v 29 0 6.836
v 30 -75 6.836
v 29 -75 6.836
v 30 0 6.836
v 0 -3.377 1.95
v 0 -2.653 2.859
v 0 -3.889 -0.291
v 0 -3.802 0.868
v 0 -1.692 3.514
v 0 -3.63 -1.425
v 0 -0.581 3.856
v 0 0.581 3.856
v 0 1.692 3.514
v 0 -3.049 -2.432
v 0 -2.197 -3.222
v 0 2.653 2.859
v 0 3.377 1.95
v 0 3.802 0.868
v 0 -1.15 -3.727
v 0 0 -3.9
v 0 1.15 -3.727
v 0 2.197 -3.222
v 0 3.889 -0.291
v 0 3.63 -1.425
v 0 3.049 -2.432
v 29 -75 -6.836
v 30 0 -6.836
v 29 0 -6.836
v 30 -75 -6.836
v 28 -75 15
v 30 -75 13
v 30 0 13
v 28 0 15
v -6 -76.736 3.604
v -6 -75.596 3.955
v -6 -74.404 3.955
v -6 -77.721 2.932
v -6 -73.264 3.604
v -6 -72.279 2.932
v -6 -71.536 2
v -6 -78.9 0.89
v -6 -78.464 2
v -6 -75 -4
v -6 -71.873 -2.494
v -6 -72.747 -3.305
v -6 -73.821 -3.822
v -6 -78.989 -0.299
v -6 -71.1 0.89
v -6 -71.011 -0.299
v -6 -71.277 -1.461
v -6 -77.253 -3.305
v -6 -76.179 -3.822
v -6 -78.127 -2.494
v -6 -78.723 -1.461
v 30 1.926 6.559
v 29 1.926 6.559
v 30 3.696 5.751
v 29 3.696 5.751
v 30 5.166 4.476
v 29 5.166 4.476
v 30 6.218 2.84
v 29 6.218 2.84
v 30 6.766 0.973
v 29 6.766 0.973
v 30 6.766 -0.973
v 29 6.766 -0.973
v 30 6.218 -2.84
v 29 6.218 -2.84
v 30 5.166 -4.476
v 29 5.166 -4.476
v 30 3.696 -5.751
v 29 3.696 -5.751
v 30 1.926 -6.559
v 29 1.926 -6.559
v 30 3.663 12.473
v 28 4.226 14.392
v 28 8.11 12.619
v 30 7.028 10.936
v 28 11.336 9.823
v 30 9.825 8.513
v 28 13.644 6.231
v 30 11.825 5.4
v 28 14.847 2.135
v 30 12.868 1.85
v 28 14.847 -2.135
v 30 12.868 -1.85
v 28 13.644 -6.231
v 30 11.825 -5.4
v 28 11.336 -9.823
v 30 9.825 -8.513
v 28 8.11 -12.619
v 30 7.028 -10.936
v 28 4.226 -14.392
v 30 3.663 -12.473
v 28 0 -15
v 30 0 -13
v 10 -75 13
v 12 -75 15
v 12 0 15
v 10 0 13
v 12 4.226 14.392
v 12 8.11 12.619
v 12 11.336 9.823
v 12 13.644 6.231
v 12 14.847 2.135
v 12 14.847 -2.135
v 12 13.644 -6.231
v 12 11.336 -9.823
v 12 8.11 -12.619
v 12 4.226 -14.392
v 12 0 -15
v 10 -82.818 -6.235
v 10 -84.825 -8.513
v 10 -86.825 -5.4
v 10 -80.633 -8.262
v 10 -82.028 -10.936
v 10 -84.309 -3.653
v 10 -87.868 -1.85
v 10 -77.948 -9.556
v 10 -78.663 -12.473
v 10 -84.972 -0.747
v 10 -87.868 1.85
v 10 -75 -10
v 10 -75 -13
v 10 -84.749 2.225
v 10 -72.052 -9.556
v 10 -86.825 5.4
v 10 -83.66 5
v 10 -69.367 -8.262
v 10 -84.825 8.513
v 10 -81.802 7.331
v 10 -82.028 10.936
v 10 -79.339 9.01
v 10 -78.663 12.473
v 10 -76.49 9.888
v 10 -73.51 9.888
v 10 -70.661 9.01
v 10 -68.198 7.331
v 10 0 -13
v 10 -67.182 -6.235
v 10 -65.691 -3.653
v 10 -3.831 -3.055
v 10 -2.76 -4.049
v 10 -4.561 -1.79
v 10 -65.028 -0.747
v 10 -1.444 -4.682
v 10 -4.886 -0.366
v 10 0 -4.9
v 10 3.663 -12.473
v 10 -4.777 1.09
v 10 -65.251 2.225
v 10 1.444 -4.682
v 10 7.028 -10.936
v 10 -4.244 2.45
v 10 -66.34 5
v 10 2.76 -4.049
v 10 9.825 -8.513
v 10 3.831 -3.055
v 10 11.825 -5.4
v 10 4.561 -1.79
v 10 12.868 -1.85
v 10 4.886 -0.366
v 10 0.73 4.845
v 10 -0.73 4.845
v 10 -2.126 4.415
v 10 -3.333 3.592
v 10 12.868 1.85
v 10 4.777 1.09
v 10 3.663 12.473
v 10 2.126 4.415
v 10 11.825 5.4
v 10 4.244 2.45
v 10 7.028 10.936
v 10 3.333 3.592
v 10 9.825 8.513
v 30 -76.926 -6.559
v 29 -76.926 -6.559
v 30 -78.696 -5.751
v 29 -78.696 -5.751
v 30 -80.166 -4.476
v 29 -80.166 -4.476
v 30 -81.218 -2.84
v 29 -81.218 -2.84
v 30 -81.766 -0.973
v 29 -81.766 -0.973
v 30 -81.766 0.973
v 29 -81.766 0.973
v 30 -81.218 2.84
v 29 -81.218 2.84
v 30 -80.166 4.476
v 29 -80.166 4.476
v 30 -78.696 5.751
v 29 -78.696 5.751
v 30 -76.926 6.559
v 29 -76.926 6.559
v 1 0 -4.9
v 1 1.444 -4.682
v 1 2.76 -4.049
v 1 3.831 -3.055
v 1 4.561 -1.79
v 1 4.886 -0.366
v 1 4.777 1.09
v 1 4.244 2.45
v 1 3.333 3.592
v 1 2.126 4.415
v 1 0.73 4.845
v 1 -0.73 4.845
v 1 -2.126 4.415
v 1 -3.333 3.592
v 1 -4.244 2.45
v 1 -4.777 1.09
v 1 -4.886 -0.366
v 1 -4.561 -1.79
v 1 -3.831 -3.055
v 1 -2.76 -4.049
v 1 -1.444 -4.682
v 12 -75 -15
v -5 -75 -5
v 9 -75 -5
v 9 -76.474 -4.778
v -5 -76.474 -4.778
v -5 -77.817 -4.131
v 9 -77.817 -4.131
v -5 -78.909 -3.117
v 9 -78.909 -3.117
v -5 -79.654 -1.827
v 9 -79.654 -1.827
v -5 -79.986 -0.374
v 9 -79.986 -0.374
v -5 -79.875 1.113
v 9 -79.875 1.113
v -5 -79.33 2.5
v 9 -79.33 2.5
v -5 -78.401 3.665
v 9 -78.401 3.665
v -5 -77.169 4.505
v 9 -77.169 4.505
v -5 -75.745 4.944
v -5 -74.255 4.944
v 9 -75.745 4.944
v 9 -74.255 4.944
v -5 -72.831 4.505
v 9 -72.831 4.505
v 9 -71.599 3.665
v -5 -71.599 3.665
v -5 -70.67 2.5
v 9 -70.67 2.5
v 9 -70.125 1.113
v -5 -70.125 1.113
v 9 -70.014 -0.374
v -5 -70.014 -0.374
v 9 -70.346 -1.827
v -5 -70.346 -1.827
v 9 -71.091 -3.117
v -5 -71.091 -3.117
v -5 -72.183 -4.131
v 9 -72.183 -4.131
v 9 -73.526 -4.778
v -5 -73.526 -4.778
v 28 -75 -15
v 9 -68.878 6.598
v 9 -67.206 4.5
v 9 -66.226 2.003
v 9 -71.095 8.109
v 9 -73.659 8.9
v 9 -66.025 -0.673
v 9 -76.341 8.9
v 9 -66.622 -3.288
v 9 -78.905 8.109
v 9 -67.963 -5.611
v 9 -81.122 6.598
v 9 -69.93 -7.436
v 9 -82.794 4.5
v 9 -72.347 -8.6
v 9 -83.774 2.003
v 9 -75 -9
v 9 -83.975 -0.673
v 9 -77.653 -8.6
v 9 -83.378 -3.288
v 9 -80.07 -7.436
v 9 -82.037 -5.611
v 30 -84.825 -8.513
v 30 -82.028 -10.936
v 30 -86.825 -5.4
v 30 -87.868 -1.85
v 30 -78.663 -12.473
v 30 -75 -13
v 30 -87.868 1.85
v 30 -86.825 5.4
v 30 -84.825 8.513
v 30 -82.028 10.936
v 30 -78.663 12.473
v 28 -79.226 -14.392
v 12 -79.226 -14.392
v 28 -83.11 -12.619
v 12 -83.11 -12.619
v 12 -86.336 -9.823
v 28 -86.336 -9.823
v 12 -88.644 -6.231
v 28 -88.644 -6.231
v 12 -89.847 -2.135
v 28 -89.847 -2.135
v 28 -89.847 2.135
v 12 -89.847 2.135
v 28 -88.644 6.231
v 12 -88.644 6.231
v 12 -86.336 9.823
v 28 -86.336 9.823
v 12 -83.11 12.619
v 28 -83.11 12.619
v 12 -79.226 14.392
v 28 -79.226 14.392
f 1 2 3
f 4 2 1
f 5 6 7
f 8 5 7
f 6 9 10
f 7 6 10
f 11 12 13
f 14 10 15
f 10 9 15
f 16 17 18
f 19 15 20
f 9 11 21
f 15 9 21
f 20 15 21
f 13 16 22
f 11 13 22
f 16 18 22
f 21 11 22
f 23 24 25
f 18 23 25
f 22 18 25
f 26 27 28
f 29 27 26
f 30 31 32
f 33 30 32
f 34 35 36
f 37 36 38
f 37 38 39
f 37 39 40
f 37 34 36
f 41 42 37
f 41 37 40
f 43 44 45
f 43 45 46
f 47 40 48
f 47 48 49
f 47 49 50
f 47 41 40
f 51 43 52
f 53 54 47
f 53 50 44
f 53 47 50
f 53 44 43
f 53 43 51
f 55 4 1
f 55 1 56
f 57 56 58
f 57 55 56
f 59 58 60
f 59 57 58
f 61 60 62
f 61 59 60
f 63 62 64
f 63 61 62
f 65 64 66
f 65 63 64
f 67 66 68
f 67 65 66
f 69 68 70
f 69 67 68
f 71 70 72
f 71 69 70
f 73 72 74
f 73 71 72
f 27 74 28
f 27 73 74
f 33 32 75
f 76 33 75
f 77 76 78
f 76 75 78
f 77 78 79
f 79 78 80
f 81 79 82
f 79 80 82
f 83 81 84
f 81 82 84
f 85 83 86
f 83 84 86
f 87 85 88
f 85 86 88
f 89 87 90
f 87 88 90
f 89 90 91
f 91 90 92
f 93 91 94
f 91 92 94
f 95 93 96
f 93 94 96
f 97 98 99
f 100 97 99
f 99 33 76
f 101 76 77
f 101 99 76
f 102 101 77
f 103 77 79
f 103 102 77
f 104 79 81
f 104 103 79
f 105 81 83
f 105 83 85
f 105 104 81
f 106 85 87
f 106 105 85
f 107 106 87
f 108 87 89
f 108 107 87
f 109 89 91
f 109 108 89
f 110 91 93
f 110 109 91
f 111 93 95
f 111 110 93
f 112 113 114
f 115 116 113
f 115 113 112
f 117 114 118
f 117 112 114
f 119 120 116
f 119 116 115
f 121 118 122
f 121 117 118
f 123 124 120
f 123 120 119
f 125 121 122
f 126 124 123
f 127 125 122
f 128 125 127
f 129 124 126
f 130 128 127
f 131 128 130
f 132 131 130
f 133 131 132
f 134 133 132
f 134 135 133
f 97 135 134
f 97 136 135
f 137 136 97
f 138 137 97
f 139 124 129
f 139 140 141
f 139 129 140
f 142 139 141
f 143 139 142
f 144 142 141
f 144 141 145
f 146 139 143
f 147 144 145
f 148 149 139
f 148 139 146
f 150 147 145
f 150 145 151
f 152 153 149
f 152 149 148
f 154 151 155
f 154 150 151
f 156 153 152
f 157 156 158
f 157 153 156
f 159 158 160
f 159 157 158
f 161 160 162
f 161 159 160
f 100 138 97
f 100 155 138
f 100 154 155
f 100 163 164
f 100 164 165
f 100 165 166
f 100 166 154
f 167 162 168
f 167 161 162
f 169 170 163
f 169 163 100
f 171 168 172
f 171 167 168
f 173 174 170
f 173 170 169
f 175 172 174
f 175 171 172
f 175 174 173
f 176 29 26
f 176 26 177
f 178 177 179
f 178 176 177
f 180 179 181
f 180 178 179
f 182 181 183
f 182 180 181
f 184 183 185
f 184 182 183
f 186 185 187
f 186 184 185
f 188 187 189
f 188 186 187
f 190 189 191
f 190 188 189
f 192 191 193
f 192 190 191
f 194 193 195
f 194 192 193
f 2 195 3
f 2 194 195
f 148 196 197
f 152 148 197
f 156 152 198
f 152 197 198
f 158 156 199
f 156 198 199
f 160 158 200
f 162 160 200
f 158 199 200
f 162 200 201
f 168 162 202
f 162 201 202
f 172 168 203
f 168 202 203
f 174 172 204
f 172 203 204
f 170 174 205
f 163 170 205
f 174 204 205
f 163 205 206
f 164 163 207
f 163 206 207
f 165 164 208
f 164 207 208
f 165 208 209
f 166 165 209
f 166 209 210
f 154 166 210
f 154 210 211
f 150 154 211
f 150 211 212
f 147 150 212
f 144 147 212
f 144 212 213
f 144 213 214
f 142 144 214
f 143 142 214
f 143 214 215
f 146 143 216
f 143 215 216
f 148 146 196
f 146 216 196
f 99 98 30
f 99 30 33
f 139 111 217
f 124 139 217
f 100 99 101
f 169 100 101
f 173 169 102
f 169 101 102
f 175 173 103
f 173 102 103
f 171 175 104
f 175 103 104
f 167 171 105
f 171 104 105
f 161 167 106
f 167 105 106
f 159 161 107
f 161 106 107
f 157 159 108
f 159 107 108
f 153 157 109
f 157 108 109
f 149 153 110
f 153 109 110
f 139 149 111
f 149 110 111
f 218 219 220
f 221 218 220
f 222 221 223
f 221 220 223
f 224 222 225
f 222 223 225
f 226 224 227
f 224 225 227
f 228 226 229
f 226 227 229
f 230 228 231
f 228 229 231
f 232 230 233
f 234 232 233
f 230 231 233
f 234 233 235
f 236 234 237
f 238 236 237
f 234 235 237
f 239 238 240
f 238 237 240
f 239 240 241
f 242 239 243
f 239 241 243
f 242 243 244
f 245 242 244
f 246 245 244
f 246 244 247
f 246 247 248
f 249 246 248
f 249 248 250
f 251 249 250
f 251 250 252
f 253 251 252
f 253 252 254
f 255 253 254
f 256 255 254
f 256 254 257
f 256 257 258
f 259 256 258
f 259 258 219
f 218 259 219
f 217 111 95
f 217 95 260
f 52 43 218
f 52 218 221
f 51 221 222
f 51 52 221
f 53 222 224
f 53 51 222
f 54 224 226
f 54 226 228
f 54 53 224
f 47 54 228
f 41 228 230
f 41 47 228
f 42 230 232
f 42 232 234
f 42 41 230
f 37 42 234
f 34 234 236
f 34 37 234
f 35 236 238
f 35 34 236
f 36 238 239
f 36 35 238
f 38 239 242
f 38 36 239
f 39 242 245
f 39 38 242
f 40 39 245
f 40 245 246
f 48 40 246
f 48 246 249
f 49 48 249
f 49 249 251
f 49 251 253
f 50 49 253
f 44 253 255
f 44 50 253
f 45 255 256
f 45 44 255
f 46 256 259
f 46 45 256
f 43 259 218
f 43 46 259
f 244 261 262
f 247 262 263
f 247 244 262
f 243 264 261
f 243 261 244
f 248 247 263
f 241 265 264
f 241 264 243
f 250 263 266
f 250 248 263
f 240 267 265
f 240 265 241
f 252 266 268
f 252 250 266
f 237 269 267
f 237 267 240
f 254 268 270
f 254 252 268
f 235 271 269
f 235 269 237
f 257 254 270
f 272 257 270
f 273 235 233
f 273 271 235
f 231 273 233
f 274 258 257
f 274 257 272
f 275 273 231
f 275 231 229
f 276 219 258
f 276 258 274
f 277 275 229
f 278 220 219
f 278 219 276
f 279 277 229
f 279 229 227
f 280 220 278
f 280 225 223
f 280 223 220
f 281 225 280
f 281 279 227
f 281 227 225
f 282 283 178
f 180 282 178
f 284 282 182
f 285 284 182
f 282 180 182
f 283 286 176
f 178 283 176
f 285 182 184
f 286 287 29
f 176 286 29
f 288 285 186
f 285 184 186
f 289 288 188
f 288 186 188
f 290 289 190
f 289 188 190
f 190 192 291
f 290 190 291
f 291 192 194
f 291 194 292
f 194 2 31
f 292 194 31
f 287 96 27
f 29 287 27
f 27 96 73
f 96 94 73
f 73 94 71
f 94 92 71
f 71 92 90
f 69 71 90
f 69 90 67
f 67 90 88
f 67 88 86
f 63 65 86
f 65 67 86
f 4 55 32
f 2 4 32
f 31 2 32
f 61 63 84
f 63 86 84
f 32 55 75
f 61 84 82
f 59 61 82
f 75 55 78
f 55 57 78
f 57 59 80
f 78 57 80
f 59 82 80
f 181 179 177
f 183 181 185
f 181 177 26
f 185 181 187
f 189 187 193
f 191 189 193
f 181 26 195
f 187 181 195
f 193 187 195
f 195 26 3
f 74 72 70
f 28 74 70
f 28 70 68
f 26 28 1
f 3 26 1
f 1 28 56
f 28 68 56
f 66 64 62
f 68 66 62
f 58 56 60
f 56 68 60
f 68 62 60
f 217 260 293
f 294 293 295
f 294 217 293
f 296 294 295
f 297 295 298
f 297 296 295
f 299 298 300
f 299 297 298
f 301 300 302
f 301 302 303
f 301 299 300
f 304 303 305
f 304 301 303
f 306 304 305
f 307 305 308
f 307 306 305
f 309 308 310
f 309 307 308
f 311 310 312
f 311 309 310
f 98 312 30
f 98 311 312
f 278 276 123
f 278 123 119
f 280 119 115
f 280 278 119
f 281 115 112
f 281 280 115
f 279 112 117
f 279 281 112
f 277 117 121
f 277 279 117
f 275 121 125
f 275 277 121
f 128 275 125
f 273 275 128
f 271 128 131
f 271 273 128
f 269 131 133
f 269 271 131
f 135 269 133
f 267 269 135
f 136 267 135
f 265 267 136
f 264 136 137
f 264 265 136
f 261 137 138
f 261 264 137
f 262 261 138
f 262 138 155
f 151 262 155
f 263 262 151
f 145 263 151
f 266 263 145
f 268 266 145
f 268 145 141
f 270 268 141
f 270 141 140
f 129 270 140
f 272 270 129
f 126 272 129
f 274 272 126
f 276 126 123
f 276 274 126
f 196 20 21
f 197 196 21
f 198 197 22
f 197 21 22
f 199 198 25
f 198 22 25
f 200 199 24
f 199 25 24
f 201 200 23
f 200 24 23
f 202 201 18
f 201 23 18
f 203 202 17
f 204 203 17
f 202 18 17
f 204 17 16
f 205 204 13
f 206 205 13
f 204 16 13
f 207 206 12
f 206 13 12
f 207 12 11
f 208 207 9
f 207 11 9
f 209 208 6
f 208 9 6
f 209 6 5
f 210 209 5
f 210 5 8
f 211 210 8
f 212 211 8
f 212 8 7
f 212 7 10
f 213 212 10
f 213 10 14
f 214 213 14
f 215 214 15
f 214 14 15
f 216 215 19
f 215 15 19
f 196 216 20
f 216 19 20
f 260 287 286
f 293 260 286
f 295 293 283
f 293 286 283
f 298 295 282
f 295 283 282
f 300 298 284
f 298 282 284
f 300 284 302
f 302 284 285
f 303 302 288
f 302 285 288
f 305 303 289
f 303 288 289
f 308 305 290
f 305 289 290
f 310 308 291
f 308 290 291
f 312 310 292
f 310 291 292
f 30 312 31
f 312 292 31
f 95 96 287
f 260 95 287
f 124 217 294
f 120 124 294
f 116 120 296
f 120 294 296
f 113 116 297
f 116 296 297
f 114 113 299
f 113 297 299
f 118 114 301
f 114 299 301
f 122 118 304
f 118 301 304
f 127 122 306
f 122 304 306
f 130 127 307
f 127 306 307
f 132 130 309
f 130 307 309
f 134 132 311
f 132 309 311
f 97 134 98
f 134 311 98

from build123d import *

# Parameters (mm, degrees)
SKETCH_1_R          = 4.9
EXTRUDE_1_DEPTH     = 10
EXTRUDE_2_DEPTH     = 20
SKETCH_3_R          = 5
EXTRUDE_3_DEPTH     = 16
CHAMFER_1_SIZE      = 2
CUT_EXTRUDE_1_DEPTH = 1
SKETCH_5_R          = 10
EXTRUDE_4_DEPTH     = 1
CHAMFER_2_SIZE      = 1
CHAMFER_3_SIZE      = 1


with BuildPart() as part:
    # 草图1 → 凸台-拉伸1 (new body)
    with BuildSketch(Plane(origin=(0, 0, 0), x_dir=(0, 0, -1), z_dir=(1, 0, 0))):
        Circle(SKETCH_1_R)
    extrude(amount=EXTRUDE_1_DEPTH)

    # 草图2 → 凸台-拉伸2 (add)
    with BuildSketch(Plane(origin=(10, 0, 0), x_dir=(0, 0, -1), z_dir=(1, 0, 0))):
        with BuildLine():
            Line((15, 0), (15, -75))
            ThreePointArc((15, -75), (0, -90), (-15, -75))
            Line((-15, -75), (-15, 0))
            ThreePointArc((-15, 0), (0, 15), (15, 0))
        make_face()
    extrude(amount=EXTRUDE_2_DEPTH)

    # 草图3 → 凸台-拉伸3 (add)
    with BuildSketch(Plane.ZY.offset(-10)):
        with Locations(Location((0, -75, 0), (0, 0, 180))):
            Circle(SKETCH_3_R)
    extrude(amount=EXTRUDE_3_DEPTH)

    # 倒角1
    chamfer_1_edges = [part.edges().sort_by_distance(p)[0] for p in [
        (10, -37.5, 15),
        (10, -90, 0),
        (30, -37.5, -15),
        (10, 15, 0),
        (30, -37.5, 15),
        (30, -90, 0),
        (30, 15, 0),
        (10, -37.5, -15),
    ]]
    chamfer(chamfer_1_edges, length=CHAMFER_1_SIZE)

    # 草图4 → 切除-拉伸1 (cut)
    with BuildSketch(Plane(origin=(30, 0, 0), x_dir=(0, 0, -1), z_dir=(1, 0, 0))):
        with BuildLine():
            Line((6.835634275, 0), (6.835634275, -75))
            ThreePointArc((6.835634275, -75), (0, -81.835634275), (-6.835634275, -75))
            Line((-6.835634275, -75), (-6.835634275, 0))
            ThreePointArc((-6.835634275, 0), (0, 6.835634275), (6.835634275, 0))
        make_face()
    extrude(amount=-CUT_EXTRUDE_1_DEPTH, mode=Mode.SUBTRACT)

    # 草图5 → 凸台-拉伸4 (add)
    with BuildSketch(Plane.ZY.offset(-10)):
        with Locations(Location((0, -75, 0), (0, 0, 180))):
            Circle(SKETCH_5_R)
    extrude(amount=EXTRUDE_4_DEPTH)

    # 倒角2
    chamfer_2_edges = [part.edges().sort_by_distance(p)[0] for p in [
        (9, -75, 10),
    ]]
    chamfer(chamfer_2_edges, length=CHAMFER_2_SIZE - 0.0001)  # a hair under: the kernel refuses the full size

    # 倒角3
    chamfer_3_edges = [part.edges().sort_by_distance(p)[0] for p in [
        (-6, -75, 5),
        (0, 0, 4.9),
    ]]
    chamfer(chamfer_3_edges, length=CHAMFER_3_SIZE)


solid = part.part
